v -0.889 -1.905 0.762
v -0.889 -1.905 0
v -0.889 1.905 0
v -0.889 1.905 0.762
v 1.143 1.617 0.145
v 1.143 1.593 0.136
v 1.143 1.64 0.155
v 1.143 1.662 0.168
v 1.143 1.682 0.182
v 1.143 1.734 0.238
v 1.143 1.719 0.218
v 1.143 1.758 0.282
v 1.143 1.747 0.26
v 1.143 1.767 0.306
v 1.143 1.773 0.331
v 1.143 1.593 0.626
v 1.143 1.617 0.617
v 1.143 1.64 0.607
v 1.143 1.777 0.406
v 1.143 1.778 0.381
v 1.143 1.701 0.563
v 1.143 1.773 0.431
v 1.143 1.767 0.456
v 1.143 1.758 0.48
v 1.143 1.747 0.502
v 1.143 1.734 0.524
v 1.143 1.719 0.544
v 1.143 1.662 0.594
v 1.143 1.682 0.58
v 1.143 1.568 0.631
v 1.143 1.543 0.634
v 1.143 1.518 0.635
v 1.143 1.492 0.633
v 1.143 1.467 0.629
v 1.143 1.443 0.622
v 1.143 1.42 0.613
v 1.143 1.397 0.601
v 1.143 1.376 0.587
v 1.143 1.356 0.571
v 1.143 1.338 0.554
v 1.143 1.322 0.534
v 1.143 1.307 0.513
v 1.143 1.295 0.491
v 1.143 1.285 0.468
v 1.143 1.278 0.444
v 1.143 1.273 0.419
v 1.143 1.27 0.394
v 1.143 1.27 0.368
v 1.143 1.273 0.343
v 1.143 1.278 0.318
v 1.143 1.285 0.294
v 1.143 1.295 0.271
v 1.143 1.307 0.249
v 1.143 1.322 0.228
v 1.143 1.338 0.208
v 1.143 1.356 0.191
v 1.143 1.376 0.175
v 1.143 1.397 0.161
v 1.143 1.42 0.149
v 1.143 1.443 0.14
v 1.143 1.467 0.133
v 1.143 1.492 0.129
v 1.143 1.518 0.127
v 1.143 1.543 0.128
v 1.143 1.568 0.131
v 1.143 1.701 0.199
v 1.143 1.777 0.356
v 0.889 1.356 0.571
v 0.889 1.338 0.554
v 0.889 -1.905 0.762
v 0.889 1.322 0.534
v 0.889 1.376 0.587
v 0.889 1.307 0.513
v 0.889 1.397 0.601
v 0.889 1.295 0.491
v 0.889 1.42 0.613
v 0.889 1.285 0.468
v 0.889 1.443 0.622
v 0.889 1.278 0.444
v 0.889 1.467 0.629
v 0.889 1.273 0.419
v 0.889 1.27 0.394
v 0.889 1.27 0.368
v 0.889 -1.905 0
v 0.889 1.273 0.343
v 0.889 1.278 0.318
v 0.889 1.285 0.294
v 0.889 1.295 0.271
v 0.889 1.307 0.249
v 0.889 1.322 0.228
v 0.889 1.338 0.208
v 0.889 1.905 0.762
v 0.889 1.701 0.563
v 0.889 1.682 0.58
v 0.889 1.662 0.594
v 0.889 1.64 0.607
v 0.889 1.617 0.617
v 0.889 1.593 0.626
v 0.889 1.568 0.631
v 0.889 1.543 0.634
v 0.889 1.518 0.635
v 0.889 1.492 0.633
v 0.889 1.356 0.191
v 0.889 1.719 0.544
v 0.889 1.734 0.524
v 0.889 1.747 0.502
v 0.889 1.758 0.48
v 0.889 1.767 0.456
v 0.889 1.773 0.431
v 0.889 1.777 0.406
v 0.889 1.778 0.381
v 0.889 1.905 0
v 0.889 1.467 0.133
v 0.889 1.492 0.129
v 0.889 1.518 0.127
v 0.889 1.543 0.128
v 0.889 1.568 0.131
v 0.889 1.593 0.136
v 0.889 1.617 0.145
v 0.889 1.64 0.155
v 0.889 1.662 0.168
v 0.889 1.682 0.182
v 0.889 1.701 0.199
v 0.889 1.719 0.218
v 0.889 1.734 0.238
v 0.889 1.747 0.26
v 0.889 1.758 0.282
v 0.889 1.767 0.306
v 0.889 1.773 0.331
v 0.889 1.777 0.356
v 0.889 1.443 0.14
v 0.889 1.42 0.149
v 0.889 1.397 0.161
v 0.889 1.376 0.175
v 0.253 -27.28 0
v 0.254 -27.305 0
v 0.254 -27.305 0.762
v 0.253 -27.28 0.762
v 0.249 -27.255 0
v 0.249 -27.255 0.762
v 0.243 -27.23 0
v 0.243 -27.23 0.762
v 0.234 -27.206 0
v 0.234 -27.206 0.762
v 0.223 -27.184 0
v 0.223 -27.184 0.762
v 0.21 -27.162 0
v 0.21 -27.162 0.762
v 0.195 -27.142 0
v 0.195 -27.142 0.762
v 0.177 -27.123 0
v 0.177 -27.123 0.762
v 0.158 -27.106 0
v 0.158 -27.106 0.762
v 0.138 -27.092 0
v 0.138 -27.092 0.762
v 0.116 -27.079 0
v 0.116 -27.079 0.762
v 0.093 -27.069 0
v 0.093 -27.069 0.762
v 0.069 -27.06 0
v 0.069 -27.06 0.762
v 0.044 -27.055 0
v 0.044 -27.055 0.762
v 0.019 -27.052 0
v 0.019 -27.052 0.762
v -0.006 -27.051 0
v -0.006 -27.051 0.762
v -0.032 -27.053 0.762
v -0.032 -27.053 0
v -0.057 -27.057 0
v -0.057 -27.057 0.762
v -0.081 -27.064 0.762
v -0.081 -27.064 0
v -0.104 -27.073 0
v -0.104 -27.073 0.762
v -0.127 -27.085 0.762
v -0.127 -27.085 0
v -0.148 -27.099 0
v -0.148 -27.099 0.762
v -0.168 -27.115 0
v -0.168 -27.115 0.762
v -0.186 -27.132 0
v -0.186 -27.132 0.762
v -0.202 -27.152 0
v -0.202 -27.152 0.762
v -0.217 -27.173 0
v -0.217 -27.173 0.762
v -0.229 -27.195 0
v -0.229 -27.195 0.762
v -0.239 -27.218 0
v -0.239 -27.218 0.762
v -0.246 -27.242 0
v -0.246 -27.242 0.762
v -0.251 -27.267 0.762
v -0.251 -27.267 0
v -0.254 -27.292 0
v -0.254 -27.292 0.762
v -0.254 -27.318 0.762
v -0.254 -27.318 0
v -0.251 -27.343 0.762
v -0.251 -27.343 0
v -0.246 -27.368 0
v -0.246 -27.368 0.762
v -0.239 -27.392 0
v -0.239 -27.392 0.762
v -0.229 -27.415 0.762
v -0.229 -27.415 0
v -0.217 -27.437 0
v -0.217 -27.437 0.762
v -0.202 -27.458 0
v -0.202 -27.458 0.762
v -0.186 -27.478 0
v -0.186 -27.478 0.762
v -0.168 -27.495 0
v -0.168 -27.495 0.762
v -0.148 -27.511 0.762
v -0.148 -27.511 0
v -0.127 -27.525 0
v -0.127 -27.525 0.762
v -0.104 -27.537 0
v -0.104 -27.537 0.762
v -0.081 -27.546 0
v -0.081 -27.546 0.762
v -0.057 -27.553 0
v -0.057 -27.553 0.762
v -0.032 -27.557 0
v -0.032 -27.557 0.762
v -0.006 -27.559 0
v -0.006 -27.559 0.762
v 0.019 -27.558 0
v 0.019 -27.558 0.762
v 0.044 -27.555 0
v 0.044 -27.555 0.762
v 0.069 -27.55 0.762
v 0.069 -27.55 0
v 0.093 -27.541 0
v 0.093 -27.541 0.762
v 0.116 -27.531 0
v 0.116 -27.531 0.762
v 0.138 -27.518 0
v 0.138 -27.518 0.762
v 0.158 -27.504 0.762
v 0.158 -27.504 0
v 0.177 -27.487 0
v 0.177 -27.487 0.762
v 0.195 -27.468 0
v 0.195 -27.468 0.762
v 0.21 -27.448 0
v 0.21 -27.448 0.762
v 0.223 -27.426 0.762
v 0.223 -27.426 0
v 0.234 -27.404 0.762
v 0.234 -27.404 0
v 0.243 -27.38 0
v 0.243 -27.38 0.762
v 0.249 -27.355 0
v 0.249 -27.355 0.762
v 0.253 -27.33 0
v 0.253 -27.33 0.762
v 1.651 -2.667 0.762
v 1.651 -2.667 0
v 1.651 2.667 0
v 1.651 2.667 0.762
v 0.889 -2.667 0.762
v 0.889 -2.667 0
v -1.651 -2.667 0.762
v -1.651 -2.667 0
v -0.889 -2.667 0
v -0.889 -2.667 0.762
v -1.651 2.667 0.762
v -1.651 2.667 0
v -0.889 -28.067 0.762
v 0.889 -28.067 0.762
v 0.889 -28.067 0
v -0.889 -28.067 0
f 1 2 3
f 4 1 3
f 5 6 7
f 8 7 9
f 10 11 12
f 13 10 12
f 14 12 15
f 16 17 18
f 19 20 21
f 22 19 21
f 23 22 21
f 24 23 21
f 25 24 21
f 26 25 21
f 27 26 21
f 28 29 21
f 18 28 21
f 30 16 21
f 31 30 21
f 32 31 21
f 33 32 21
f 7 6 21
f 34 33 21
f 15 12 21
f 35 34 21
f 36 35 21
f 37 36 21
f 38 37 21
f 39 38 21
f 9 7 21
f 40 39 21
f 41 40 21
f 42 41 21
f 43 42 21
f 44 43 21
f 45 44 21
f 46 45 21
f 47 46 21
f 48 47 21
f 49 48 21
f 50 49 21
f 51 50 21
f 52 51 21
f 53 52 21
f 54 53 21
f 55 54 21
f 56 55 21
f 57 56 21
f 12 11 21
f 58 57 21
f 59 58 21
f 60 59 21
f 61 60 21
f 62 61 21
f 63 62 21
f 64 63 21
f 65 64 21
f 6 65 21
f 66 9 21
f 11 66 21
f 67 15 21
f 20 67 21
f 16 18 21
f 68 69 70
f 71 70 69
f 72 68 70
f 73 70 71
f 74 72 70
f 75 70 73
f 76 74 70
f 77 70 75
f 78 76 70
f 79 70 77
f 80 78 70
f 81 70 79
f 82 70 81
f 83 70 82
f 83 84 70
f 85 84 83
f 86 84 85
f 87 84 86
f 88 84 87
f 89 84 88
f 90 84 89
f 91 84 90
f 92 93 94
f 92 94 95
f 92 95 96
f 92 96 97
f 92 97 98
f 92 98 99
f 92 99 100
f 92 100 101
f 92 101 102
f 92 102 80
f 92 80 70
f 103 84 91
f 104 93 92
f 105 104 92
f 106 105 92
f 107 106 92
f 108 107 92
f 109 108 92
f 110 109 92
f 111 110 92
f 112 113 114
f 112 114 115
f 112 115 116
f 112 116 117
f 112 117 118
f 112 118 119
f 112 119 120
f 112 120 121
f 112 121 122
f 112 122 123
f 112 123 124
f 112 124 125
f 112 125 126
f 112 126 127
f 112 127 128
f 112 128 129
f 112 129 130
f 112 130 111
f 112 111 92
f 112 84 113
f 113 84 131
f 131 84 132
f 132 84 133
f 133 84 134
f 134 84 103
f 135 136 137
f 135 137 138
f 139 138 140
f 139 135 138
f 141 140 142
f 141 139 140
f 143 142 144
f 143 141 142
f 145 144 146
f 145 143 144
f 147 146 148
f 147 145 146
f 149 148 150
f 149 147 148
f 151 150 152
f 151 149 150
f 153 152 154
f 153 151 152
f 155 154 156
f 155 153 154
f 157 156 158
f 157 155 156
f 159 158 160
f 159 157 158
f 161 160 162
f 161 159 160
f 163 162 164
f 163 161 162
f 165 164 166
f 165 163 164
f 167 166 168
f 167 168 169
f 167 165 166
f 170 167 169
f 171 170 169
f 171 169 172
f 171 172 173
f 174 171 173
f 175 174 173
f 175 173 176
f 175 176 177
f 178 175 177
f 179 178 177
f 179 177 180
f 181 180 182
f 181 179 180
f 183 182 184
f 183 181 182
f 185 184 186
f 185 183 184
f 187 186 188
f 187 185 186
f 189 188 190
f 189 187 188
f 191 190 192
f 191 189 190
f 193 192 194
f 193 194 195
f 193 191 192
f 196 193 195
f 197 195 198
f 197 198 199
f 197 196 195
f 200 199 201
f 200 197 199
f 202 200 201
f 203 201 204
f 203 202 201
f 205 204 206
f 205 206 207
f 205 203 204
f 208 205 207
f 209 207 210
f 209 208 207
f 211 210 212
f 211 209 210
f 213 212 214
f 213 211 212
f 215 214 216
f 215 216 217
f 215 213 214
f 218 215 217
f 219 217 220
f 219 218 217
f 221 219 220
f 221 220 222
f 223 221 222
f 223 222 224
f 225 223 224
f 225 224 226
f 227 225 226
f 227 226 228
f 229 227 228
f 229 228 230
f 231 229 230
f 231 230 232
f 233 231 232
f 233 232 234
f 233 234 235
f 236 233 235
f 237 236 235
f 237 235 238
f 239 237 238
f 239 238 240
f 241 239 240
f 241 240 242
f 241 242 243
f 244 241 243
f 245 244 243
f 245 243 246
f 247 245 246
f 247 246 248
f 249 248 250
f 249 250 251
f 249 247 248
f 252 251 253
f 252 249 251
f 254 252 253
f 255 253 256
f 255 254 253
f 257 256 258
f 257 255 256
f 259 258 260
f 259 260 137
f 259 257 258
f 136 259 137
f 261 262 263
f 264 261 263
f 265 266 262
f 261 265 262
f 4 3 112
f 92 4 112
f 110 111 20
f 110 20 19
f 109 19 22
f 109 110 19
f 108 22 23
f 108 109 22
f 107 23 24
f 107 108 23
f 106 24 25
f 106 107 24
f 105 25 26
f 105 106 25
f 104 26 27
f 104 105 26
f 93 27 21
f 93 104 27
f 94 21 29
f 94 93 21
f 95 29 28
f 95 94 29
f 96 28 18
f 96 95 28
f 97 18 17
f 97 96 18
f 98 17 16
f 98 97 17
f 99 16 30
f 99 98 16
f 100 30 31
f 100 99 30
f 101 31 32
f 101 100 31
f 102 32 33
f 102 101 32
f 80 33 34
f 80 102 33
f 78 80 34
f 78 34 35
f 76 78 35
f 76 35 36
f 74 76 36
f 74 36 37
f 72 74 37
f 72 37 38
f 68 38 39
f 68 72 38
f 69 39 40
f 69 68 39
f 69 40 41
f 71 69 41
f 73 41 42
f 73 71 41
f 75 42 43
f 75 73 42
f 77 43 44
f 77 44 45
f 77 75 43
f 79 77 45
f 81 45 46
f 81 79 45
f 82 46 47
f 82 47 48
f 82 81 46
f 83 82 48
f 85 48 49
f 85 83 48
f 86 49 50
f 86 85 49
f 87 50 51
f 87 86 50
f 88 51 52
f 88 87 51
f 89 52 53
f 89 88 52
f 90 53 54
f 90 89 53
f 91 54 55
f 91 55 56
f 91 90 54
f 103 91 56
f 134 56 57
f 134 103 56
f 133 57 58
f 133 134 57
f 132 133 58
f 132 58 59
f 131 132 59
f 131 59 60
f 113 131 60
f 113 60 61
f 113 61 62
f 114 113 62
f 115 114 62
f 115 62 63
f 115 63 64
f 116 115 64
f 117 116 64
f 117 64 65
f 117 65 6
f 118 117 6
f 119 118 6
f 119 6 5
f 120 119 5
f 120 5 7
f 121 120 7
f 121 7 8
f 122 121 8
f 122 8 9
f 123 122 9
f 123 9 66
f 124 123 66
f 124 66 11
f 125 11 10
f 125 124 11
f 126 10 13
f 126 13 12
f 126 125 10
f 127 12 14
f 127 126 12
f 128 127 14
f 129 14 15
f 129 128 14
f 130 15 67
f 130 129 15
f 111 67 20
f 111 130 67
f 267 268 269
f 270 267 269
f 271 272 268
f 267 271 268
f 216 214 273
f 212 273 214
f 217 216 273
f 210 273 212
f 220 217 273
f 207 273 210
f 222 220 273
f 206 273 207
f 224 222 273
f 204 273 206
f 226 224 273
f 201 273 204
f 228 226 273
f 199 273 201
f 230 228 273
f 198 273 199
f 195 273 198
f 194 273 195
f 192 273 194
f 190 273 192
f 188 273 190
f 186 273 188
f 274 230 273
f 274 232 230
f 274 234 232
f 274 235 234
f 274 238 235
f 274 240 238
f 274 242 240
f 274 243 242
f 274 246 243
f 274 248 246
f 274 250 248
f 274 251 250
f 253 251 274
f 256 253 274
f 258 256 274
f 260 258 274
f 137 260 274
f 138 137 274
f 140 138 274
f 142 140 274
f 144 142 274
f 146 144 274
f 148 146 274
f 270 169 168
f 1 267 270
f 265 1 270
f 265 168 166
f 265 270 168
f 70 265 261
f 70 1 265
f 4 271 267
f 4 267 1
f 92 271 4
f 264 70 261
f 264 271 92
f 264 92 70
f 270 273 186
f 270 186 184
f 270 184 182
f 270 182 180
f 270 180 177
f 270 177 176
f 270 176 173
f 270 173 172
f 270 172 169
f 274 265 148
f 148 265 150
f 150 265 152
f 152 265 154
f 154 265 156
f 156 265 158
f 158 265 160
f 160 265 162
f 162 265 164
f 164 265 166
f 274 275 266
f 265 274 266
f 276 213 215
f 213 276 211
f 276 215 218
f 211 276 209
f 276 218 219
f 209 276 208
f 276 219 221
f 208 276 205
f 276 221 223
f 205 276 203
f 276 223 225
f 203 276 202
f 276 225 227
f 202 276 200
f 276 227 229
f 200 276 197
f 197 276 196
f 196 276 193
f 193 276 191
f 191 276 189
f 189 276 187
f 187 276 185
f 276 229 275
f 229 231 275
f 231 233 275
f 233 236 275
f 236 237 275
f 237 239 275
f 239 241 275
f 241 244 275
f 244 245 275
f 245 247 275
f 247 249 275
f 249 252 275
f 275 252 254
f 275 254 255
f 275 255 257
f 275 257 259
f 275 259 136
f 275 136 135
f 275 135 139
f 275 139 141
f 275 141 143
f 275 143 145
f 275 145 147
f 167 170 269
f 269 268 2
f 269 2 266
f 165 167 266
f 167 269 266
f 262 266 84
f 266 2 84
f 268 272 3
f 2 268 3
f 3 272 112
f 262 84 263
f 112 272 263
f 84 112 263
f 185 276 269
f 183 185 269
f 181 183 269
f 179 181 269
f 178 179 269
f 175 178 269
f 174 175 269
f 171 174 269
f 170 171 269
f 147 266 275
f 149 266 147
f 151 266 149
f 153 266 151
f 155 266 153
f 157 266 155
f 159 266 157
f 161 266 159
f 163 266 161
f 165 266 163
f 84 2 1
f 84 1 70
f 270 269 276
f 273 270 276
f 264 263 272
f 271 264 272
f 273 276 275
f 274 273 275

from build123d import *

# Parameters (mm, degrees)
F0_R      = 0.254
F0_W      = 1.778
F0_H      = 3.81
F1_DEPTH  = 0.762
F3_R      = 0.254
F1_FACE_W = 5.334
F1_FACE_H = 0.762
F4_DEPTH  = 0.254


with BuildPart() as f1:
    # F0 (on Top) → F1 (new body)
    with BuildSketch(Plane.XY):
        Polygon((0.889, -2.667), (1.651, -2.667), (1.651, 2.667), (-1.651, 2.667), (-1.651, -2.667), (-0.889, -2.667), (-0.889, -28.067), (0.889, -28.067), align=None)
        with Locations((0, -27.305)):
            Circle(F0_R, mode=Mode.SUBTRACT)
        Rectangle(F0_W, F0_H, mode=Mode.SUBTRACT)
    extrude(amount=F1_DEPTH)

    # F3 (on offset) + F1_face (on face) → F4 (cut)
    with BuildSketch(Plane.YZ.offset(0.889)):
        with Locations((1.524, 0.381)):
            Circle(F3_R)
    with BuildSketch(Plane(origin=(1.651, 0, 0.381), x_dir=(0, 1, 0), z_dir=(1, 0, 0))):
        Rectangle(F1_FACE_W, F1_FACE_H)
    extrude(amount=F4_DEPTH, mode=Mode.SUBTRACT)


solid = f1.part
